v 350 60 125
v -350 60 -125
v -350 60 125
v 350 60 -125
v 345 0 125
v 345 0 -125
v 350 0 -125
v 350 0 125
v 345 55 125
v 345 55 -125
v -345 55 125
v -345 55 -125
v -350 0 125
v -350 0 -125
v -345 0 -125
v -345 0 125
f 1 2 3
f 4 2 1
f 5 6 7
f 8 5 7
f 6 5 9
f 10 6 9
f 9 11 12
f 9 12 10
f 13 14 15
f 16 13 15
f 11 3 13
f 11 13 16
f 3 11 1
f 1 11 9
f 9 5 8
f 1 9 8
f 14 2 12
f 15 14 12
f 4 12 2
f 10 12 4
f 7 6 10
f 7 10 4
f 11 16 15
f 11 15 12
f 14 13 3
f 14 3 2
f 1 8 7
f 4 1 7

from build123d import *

# Parameters (mm, degrees)
SKETCH1_W           = 700
SKETCH1_H           = 250
BOSS_EXTRUDE1_DEPTH = 60
SHELL1_T            = -5
SKETCH3_W           = 690
SKETCH3_H           = 55
CUT_EXTRUDE1_DEPTH  = 435.281015012


with BuildPart() as part:
    # Sketch1 → Boss-Extrude1 (new body)
    with BuildSketch(Plane(origin=(0, 0, 0), x_dir=(1, 0, 0), z_dir=(0, 1, 0))):
        Rectangle(SKETCH1_W, SKETCH1_H)
    extrude(amount=BOSS_EXTRUDE1_DEPTH)

    # Shell1
    shell1_openings = [part.faces().sort_by_distance(p)[0] for p in [
        (0, 0, 0),
    ]]
    offset(amount=SHELL1_T, openings=shell1_openings, kind=Kind.INTERSECTION)

    # Sketch3 → Cut-Extrude1 (cut, through all)
    with BuildSketch(Plane.XY.offset(125)):
        with Locations((0, 27.5)):
            Rectangle(SKETCH3_W, SKETCH3_H)
    extrude(amount=-CUT_EXTRUDE1_DEPTH, mode=Mode.SUBTRACT)


solid = part.part
